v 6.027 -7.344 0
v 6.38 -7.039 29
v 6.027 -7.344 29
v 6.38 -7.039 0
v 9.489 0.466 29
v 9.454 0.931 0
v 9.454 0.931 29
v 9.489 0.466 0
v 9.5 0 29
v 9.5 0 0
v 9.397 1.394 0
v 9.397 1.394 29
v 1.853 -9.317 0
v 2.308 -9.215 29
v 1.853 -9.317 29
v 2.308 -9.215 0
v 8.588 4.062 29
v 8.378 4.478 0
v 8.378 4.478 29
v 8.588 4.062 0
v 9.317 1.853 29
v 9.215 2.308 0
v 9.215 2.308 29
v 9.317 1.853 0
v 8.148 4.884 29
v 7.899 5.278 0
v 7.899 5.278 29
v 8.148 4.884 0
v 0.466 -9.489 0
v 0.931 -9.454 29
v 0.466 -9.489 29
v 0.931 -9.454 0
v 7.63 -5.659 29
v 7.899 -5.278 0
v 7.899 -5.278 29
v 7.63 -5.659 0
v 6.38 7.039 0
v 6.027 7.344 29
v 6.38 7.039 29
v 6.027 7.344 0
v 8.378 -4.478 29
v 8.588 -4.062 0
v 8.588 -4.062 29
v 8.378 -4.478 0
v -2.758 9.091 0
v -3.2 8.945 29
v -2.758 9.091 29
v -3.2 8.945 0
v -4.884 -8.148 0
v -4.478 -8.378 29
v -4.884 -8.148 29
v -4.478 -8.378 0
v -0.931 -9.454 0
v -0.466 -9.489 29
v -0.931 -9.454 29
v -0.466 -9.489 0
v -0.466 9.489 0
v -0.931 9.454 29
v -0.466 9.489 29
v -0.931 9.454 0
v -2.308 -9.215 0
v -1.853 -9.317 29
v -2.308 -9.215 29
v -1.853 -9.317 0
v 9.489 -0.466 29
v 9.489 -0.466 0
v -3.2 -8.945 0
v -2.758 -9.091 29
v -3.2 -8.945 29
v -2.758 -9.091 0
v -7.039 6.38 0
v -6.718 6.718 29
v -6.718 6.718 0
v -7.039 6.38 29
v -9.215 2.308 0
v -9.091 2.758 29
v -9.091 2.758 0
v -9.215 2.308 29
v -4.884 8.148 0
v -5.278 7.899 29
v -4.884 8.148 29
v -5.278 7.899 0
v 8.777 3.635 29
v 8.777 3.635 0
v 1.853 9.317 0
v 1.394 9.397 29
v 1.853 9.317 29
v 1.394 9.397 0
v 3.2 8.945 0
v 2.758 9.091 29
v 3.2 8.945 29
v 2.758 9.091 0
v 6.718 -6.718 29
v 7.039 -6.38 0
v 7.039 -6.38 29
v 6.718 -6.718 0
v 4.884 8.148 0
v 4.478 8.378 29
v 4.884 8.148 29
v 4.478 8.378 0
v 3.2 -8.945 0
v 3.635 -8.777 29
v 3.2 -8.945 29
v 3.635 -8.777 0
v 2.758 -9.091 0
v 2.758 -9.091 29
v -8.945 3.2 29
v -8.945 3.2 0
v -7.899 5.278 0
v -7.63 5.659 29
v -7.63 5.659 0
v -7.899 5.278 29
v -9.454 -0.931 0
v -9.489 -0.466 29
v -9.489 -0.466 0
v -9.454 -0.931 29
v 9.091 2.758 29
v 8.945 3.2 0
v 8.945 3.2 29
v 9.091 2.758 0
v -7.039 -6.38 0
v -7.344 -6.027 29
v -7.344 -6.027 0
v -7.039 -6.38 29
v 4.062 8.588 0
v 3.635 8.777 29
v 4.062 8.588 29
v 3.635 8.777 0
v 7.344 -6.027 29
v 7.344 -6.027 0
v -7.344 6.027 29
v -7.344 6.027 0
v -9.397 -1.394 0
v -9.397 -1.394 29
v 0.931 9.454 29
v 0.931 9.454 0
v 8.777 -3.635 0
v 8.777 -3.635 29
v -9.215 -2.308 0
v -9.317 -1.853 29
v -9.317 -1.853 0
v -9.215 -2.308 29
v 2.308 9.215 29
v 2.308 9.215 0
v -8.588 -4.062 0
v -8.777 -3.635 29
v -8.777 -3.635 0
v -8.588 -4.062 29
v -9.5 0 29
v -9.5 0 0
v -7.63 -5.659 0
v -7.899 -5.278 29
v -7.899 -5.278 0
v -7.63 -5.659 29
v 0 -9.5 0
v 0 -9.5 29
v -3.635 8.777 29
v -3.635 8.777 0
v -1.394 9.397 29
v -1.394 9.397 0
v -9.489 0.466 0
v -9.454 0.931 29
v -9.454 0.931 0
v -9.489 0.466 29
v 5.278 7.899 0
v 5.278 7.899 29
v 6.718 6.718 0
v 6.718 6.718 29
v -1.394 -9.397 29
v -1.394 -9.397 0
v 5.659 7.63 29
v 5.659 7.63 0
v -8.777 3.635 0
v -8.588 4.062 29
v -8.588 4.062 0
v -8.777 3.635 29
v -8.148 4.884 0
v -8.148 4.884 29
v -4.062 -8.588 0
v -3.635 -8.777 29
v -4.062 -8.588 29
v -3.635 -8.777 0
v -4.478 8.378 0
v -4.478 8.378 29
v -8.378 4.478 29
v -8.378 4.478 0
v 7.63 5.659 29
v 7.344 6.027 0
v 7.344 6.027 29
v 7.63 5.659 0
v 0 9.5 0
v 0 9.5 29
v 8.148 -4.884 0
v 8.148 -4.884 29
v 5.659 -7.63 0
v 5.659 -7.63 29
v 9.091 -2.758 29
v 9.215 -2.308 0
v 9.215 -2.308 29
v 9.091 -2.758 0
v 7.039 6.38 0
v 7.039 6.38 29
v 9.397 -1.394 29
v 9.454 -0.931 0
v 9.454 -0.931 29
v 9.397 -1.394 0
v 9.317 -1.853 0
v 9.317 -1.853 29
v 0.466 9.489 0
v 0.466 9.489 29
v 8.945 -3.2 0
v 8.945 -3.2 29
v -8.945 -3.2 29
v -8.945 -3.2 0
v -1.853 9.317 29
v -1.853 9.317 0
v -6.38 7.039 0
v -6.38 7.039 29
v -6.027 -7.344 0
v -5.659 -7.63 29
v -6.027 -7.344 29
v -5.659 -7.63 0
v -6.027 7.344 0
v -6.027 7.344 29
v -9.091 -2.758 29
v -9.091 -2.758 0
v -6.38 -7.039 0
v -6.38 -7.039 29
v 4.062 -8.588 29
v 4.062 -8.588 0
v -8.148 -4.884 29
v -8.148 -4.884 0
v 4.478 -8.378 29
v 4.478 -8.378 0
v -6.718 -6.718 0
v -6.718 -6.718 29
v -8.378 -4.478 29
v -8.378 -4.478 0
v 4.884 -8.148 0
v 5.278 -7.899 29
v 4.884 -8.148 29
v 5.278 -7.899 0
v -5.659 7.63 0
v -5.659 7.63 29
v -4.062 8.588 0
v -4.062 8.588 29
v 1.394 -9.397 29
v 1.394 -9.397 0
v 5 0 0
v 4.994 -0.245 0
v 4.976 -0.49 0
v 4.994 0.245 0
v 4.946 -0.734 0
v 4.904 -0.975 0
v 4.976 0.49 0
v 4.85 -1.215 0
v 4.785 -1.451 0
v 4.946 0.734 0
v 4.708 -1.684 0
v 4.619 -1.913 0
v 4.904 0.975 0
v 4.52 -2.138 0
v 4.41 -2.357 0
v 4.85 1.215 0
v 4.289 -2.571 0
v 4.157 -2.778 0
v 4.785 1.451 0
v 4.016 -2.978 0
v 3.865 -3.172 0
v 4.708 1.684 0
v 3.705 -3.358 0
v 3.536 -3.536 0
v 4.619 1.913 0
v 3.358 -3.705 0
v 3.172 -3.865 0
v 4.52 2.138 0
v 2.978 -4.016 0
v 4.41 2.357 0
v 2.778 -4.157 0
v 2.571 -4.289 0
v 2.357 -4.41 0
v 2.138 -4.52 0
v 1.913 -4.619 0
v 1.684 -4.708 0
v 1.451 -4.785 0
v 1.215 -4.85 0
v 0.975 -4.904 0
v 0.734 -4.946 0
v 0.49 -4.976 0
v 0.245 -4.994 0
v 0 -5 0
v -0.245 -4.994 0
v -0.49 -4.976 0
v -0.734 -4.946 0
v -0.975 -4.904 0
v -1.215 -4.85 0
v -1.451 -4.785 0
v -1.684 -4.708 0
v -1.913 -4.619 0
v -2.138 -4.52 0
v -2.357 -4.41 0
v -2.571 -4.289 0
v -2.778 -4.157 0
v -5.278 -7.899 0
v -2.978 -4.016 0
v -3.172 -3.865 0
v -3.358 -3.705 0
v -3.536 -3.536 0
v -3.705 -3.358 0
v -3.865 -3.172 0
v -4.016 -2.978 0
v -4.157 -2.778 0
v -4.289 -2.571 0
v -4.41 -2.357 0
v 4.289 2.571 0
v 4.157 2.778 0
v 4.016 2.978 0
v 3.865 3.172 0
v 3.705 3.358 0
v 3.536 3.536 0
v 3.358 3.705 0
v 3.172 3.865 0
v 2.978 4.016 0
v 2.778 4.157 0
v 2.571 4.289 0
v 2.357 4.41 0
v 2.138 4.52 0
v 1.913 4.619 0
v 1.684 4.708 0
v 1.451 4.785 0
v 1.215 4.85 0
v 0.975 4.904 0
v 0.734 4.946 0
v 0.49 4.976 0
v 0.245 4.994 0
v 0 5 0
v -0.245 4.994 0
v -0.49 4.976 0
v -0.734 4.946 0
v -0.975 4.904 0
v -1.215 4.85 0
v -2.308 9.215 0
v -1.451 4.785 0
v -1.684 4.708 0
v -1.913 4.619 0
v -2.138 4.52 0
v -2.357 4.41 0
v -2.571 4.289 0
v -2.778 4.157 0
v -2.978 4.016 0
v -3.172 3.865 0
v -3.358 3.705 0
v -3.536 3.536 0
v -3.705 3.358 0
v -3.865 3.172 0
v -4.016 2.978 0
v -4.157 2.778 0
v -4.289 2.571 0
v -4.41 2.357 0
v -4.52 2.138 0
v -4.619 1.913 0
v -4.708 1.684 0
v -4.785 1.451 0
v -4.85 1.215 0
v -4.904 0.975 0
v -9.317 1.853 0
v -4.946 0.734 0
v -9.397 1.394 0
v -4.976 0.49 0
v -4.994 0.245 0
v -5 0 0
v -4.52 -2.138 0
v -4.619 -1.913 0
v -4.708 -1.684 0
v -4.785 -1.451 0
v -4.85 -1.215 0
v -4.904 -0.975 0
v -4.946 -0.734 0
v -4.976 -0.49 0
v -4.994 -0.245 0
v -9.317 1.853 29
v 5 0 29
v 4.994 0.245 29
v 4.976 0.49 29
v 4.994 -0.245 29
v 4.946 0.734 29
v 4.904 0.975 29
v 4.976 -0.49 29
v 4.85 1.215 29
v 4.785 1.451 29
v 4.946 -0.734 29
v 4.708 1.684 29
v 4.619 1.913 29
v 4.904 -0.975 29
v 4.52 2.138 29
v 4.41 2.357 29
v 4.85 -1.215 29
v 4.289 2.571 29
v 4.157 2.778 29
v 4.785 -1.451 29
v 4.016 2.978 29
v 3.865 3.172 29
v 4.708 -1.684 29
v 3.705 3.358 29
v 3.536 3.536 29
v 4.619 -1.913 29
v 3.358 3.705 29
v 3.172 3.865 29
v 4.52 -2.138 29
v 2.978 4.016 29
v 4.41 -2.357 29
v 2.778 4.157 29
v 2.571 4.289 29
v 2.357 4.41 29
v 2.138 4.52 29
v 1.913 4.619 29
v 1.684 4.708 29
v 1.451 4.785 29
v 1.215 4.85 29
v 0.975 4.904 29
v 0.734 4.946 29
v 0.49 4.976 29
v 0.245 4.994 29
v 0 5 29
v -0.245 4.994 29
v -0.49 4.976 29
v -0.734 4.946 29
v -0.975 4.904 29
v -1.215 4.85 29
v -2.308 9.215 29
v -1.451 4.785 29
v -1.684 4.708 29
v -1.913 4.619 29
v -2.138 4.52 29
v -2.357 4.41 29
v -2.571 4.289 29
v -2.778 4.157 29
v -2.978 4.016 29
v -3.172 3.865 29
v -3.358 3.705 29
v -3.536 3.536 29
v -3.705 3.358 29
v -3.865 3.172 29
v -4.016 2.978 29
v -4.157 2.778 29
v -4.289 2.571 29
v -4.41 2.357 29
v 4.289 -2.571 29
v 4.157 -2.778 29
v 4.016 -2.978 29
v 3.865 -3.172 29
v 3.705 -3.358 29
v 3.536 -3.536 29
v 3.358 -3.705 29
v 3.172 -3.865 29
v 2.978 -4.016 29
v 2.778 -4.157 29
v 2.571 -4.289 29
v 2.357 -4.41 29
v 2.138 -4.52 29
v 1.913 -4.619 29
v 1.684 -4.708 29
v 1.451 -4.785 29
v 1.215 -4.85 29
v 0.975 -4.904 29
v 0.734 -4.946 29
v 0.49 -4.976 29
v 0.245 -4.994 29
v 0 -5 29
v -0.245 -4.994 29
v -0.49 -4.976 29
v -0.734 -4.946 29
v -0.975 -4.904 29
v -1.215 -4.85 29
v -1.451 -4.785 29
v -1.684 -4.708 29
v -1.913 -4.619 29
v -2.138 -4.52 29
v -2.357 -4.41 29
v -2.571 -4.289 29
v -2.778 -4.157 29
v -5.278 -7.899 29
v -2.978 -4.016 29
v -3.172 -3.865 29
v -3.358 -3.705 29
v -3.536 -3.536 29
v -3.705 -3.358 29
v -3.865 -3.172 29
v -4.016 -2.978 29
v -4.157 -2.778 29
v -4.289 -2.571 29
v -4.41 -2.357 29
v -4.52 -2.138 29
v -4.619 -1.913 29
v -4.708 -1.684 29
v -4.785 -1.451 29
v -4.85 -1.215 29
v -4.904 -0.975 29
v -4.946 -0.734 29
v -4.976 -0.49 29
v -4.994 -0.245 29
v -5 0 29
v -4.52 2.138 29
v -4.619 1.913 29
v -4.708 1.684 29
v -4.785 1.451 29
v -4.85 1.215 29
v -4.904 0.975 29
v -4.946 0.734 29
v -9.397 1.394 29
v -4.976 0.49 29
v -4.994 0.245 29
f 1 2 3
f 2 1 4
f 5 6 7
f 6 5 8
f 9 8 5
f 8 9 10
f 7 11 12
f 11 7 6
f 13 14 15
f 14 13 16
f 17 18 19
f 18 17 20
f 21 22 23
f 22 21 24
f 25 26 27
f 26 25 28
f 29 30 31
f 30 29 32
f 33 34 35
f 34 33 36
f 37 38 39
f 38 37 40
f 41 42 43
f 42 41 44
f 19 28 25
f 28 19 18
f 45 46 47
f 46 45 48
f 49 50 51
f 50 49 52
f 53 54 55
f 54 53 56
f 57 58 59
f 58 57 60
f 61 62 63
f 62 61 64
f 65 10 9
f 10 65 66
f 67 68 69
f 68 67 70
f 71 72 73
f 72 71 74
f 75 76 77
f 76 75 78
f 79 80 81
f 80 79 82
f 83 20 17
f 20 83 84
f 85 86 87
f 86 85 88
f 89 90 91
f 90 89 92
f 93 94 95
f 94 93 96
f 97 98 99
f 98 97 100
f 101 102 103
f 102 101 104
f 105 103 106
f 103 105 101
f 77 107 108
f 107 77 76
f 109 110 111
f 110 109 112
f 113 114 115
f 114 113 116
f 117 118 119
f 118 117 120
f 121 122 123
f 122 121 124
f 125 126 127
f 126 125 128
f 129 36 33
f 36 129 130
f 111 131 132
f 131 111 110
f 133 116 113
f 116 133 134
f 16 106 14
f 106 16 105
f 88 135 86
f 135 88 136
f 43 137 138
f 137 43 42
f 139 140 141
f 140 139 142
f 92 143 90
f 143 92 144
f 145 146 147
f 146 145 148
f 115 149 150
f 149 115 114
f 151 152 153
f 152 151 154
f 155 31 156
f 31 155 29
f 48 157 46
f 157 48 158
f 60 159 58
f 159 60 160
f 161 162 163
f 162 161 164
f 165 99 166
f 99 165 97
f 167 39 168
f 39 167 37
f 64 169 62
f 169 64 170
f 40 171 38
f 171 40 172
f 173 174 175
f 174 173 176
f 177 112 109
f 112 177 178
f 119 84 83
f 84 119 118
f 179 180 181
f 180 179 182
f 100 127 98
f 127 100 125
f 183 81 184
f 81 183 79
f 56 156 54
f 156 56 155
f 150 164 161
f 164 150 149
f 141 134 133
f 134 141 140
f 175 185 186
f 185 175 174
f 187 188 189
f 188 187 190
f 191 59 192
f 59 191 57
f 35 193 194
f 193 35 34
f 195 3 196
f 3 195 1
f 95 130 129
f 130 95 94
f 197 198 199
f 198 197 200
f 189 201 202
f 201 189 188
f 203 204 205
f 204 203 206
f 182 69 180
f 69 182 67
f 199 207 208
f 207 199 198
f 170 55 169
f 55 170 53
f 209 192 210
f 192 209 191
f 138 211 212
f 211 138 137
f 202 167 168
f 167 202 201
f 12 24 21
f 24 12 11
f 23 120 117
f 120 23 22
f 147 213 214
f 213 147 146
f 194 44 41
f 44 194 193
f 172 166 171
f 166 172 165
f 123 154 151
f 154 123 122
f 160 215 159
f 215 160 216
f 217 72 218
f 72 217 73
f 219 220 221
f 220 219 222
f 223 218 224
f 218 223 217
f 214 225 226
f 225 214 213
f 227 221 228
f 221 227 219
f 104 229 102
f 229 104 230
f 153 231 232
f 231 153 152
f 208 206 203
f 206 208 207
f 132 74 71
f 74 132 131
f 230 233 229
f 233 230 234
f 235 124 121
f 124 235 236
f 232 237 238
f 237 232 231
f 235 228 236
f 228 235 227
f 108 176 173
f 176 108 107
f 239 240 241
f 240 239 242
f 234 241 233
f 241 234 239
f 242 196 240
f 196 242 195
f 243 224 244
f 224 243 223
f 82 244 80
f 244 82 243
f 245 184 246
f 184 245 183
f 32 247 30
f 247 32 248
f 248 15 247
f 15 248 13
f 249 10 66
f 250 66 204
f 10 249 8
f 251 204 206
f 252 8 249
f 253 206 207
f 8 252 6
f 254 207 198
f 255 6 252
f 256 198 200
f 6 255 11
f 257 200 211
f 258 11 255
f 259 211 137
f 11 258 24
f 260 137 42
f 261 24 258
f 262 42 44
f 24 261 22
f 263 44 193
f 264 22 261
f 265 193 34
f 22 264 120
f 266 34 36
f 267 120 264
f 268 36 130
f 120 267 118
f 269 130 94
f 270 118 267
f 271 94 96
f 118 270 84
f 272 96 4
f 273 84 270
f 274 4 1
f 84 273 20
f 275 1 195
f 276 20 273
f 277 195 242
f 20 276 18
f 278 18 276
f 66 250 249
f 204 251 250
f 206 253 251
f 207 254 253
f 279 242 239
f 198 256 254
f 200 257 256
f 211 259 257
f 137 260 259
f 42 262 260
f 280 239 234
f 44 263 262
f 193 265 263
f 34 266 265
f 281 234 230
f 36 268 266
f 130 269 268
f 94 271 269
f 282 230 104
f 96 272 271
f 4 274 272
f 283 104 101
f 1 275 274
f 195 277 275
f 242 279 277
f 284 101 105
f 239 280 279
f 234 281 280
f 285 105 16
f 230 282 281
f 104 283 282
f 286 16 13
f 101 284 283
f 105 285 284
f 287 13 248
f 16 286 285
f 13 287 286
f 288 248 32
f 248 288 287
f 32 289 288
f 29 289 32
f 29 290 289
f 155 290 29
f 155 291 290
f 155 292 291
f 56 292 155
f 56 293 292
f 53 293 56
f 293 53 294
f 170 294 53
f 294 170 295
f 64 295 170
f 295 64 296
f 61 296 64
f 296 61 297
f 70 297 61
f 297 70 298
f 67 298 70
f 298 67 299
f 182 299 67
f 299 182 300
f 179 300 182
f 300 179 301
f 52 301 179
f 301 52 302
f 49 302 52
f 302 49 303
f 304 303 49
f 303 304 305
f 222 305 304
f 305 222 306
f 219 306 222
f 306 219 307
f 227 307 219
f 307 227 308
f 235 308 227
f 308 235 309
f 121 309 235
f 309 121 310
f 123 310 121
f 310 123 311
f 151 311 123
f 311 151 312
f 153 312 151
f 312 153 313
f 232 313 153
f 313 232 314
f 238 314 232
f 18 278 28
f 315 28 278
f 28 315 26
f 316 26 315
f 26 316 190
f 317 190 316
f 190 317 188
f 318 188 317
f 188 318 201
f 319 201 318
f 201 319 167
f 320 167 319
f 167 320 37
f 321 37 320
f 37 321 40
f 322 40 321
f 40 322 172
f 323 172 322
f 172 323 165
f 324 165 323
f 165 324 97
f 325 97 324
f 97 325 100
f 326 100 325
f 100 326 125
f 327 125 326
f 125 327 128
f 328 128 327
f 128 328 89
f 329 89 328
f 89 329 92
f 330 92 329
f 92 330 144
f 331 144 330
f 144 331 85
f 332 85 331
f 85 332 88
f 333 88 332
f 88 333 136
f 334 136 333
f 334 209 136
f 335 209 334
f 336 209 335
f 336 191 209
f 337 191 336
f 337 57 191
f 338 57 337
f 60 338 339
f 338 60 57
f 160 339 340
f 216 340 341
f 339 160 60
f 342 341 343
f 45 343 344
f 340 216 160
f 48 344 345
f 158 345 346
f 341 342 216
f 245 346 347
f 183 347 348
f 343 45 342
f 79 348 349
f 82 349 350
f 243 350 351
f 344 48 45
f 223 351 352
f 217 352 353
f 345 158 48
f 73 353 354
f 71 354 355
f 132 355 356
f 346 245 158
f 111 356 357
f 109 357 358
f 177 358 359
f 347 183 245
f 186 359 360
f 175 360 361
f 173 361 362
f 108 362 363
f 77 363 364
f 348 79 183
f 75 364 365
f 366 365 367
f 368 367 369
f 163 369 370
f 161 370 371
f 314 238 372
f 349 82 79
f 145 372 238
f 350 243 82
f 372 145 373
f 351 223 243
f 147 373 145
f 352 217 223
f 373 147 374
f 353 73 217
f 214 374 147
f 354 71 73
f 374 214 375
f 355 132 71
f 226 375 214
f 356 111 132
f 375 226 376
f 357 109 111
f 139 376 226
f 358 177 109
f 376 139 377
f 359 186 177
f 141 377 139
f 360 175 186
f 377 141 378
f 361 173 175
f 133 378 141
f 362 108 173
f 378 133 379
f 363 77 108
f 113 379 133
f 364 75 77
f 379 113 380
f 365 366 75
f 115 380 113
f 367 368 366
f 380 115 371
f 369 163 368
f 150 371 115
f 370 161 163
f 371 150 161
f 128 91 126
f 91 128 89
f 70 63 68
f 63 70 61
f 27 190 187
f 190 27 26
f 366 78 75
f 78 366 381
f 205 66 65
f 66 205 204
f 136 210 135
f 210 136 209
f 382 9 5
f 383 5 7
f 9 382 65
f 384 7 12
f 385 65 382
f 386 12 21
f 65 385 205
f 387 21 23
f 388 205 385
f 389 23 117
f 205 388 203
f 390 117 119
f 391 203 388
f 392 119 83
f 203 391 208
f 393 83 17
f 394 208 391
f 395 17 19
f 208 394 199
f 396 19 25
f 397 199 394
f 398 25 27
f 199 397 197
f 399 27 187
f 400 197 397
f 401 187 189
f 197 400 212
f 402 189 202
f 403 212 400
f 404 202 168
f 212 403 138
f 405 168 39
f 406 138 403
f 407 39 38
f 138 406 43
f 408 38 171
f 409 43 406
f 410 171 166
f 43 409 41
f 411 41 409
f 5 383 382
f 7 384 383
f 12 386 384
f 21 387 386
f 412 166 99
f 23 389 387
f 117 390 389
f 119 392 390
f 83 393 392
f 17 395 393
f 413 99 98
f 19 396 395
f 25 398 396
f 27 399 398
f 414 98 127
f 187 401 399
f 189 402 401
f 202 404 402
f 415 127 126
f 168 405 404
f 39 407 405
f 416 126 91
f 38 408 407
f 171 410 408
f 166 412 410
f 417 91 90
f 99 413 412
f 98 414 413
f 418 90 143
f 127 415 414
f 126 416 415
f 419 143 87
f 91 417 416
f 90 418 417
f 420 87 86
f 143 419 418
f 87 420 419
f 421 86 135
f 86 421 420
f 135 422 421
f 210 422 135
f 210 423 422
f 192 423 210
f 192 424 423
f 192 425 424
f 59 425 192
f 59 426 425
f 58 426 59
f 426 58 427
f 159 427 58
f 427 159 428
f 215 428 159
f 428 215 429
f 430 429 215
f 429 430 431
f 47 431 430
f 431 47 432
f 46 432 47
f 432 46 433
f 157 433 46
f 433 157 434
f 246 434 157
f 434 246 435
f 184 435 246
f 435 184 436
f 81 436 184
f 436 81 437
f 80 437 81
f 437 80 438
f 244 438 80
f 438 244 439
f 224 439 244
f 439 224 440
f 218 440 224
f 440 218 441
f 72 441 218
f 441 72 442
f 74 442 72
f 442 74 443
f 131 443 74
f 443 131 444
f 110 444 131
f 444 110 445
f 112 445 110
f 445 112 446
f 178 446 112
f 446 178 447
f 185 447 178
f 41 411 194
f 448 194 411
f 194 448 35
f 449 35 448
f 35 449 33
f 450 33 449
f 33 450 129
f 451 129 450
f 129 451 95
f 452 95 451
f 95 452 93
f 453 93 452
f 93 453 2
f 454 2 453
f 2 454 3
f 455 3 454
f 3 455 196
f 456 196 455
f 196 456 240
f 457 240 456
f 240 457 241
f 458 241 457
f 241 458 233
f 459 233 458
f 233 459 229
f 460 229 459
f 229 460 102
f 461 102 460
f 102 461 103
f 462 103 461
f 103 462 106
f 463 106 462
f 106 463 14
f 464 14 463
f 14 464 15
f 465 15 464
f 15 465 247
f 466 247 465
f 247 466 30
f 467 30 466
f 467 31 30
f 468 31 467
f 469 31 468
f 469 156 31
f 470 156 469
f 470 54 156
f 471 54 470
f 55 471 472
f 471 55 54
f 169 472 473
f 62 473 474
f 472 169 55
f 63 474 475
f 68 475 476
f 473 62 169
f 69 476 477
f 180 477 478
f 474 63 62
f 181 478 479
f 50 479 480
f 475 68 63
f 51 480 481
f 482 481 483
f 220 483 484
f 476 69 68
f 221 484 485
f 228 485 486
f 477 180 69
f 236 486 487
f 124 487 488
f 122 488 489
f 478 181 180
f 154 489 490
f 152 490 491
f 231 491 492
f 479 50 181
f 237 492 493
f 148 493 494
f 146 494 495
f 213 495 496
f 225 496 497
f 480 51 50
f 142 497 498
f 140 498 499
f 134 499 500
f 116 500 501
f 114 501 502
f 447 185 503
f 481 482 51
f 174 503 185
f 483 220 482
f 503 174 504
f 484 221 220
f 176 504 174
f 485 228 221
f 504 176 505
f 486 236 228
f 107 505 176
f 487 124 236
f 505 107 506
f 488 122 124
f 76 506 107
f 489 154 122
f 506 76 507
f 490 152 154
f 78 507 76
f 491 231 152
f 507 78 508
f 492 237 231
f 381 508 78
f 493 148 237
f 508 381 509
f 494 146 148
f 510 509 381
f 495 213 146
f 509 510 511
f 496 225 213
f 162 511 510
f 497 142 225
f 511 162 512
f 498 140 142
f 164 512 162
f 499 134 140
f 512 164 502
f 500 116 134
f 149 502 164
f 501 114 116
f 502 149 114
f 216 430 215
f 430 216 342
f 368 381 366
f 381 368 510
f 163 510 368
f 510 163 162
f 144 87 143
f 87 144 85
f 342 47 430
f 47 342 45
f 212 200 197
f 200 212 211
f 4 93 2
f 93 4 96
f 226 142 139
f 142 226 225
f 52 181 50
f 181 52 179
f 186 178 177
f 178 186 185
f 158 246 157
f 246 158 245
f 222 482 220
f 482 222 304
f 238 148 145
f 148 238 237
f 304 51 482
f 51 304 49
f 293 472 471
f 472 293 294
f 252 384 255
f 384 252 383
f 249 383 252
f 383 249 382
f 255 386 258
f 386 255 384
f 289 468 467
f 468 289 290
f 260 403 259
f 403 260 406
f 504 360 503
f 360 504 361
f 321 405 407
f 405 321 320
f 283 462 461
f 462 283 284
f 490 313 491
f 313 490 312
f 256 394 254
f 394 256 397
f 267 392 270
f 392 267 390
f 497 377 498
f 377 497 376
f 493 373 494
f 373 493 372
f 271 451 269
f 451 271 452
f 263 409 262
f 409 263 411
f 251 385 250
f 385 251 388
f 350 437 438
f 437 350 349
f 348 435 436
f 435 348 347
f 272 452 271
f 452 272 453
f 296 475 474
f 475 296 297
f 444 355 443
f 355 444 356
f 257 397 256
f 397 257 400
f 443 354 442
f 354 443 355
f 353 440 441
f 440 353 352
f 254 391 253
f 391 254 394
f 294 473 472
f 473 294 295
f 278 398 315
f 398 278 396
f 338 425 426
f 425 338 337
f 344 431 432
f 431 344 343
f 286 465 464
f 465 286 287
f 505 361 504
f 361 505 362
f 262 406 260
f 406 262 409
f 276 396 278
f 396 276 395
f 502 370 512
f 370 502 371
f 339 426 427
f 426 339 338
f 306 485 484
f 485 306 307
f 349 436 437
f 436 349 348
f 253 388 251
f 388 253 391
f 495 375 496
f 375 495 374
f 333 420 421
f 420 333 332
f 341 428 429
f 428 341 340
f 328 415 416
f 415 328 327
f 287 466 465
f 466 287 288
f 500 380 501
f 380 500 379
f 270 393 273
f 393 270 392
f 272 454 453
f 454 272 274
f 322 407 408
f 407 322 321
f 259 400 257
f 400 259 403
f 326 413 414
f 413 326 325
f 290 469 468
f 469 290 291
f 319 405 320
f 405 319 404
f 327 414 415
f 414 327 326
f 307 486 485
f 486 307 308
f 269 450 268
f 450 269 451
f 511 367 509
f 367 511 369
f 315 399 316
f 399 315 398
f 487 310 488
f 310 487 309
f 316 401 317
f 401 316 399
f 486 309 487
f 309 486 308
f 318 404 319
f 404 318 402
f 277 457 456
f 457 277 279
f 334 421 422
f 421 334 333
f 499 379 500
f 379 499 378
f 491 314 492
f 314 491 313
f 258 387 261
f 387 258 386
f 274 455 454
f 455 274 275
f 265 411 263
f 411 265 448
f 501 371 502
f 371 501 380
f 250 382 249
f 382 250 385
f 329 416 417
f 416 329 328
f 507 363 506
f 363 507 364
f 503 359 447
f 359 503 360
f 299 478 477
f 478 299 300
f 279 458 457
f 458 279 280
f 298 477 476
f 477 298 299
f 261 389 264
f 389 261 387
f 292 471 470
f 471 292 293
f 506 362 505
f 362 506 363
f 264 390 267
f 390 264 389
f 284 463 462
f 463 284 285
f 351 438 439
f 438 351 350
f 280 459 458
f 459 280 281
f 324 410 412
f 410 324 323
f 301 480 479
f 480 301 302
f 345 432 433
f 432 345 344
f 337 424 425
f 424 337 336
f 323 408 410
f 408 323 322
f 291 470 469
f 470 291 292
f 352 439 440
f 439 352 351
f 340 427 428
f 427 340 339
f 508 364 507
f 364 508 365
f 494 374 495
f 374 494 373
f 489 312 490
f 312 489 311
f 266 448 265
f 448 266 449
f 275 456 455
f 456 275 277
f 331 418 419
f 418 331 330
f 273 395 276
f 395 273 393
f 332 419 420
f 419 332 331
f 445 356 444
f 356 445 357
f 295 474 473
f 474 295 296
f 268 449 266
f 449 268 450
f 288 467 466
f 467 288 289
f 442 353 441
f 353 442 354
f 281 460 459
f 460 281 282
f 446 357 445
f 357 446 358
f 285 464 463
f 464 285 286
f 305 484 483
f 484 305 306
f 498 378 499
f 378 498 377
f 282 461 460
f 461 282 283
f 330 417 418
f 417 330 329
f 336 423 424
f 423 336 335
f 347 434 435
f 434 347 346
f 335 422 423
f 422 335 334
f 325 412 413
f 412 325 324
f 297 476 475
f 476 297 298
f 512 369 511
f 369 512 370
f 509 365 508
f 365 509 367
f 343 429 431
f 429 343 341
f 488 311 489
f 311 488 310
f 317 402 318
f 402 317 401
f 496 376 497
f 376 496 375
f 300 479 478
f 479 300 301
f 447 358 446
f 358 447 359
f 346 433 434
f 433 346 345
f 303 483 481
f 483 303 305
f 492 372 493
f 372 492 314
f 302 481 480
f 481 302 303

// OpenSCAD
$fn = 128;

bore_d = 10.0;
od_d   = 19.0;
len    = 29.0;

difference() {
  cylinder(d = od_d, h = len, center = false);
  translate([0,0,-0.1])
    cylinder(d = bore_d, h = len + 0.2, center = false);
}
